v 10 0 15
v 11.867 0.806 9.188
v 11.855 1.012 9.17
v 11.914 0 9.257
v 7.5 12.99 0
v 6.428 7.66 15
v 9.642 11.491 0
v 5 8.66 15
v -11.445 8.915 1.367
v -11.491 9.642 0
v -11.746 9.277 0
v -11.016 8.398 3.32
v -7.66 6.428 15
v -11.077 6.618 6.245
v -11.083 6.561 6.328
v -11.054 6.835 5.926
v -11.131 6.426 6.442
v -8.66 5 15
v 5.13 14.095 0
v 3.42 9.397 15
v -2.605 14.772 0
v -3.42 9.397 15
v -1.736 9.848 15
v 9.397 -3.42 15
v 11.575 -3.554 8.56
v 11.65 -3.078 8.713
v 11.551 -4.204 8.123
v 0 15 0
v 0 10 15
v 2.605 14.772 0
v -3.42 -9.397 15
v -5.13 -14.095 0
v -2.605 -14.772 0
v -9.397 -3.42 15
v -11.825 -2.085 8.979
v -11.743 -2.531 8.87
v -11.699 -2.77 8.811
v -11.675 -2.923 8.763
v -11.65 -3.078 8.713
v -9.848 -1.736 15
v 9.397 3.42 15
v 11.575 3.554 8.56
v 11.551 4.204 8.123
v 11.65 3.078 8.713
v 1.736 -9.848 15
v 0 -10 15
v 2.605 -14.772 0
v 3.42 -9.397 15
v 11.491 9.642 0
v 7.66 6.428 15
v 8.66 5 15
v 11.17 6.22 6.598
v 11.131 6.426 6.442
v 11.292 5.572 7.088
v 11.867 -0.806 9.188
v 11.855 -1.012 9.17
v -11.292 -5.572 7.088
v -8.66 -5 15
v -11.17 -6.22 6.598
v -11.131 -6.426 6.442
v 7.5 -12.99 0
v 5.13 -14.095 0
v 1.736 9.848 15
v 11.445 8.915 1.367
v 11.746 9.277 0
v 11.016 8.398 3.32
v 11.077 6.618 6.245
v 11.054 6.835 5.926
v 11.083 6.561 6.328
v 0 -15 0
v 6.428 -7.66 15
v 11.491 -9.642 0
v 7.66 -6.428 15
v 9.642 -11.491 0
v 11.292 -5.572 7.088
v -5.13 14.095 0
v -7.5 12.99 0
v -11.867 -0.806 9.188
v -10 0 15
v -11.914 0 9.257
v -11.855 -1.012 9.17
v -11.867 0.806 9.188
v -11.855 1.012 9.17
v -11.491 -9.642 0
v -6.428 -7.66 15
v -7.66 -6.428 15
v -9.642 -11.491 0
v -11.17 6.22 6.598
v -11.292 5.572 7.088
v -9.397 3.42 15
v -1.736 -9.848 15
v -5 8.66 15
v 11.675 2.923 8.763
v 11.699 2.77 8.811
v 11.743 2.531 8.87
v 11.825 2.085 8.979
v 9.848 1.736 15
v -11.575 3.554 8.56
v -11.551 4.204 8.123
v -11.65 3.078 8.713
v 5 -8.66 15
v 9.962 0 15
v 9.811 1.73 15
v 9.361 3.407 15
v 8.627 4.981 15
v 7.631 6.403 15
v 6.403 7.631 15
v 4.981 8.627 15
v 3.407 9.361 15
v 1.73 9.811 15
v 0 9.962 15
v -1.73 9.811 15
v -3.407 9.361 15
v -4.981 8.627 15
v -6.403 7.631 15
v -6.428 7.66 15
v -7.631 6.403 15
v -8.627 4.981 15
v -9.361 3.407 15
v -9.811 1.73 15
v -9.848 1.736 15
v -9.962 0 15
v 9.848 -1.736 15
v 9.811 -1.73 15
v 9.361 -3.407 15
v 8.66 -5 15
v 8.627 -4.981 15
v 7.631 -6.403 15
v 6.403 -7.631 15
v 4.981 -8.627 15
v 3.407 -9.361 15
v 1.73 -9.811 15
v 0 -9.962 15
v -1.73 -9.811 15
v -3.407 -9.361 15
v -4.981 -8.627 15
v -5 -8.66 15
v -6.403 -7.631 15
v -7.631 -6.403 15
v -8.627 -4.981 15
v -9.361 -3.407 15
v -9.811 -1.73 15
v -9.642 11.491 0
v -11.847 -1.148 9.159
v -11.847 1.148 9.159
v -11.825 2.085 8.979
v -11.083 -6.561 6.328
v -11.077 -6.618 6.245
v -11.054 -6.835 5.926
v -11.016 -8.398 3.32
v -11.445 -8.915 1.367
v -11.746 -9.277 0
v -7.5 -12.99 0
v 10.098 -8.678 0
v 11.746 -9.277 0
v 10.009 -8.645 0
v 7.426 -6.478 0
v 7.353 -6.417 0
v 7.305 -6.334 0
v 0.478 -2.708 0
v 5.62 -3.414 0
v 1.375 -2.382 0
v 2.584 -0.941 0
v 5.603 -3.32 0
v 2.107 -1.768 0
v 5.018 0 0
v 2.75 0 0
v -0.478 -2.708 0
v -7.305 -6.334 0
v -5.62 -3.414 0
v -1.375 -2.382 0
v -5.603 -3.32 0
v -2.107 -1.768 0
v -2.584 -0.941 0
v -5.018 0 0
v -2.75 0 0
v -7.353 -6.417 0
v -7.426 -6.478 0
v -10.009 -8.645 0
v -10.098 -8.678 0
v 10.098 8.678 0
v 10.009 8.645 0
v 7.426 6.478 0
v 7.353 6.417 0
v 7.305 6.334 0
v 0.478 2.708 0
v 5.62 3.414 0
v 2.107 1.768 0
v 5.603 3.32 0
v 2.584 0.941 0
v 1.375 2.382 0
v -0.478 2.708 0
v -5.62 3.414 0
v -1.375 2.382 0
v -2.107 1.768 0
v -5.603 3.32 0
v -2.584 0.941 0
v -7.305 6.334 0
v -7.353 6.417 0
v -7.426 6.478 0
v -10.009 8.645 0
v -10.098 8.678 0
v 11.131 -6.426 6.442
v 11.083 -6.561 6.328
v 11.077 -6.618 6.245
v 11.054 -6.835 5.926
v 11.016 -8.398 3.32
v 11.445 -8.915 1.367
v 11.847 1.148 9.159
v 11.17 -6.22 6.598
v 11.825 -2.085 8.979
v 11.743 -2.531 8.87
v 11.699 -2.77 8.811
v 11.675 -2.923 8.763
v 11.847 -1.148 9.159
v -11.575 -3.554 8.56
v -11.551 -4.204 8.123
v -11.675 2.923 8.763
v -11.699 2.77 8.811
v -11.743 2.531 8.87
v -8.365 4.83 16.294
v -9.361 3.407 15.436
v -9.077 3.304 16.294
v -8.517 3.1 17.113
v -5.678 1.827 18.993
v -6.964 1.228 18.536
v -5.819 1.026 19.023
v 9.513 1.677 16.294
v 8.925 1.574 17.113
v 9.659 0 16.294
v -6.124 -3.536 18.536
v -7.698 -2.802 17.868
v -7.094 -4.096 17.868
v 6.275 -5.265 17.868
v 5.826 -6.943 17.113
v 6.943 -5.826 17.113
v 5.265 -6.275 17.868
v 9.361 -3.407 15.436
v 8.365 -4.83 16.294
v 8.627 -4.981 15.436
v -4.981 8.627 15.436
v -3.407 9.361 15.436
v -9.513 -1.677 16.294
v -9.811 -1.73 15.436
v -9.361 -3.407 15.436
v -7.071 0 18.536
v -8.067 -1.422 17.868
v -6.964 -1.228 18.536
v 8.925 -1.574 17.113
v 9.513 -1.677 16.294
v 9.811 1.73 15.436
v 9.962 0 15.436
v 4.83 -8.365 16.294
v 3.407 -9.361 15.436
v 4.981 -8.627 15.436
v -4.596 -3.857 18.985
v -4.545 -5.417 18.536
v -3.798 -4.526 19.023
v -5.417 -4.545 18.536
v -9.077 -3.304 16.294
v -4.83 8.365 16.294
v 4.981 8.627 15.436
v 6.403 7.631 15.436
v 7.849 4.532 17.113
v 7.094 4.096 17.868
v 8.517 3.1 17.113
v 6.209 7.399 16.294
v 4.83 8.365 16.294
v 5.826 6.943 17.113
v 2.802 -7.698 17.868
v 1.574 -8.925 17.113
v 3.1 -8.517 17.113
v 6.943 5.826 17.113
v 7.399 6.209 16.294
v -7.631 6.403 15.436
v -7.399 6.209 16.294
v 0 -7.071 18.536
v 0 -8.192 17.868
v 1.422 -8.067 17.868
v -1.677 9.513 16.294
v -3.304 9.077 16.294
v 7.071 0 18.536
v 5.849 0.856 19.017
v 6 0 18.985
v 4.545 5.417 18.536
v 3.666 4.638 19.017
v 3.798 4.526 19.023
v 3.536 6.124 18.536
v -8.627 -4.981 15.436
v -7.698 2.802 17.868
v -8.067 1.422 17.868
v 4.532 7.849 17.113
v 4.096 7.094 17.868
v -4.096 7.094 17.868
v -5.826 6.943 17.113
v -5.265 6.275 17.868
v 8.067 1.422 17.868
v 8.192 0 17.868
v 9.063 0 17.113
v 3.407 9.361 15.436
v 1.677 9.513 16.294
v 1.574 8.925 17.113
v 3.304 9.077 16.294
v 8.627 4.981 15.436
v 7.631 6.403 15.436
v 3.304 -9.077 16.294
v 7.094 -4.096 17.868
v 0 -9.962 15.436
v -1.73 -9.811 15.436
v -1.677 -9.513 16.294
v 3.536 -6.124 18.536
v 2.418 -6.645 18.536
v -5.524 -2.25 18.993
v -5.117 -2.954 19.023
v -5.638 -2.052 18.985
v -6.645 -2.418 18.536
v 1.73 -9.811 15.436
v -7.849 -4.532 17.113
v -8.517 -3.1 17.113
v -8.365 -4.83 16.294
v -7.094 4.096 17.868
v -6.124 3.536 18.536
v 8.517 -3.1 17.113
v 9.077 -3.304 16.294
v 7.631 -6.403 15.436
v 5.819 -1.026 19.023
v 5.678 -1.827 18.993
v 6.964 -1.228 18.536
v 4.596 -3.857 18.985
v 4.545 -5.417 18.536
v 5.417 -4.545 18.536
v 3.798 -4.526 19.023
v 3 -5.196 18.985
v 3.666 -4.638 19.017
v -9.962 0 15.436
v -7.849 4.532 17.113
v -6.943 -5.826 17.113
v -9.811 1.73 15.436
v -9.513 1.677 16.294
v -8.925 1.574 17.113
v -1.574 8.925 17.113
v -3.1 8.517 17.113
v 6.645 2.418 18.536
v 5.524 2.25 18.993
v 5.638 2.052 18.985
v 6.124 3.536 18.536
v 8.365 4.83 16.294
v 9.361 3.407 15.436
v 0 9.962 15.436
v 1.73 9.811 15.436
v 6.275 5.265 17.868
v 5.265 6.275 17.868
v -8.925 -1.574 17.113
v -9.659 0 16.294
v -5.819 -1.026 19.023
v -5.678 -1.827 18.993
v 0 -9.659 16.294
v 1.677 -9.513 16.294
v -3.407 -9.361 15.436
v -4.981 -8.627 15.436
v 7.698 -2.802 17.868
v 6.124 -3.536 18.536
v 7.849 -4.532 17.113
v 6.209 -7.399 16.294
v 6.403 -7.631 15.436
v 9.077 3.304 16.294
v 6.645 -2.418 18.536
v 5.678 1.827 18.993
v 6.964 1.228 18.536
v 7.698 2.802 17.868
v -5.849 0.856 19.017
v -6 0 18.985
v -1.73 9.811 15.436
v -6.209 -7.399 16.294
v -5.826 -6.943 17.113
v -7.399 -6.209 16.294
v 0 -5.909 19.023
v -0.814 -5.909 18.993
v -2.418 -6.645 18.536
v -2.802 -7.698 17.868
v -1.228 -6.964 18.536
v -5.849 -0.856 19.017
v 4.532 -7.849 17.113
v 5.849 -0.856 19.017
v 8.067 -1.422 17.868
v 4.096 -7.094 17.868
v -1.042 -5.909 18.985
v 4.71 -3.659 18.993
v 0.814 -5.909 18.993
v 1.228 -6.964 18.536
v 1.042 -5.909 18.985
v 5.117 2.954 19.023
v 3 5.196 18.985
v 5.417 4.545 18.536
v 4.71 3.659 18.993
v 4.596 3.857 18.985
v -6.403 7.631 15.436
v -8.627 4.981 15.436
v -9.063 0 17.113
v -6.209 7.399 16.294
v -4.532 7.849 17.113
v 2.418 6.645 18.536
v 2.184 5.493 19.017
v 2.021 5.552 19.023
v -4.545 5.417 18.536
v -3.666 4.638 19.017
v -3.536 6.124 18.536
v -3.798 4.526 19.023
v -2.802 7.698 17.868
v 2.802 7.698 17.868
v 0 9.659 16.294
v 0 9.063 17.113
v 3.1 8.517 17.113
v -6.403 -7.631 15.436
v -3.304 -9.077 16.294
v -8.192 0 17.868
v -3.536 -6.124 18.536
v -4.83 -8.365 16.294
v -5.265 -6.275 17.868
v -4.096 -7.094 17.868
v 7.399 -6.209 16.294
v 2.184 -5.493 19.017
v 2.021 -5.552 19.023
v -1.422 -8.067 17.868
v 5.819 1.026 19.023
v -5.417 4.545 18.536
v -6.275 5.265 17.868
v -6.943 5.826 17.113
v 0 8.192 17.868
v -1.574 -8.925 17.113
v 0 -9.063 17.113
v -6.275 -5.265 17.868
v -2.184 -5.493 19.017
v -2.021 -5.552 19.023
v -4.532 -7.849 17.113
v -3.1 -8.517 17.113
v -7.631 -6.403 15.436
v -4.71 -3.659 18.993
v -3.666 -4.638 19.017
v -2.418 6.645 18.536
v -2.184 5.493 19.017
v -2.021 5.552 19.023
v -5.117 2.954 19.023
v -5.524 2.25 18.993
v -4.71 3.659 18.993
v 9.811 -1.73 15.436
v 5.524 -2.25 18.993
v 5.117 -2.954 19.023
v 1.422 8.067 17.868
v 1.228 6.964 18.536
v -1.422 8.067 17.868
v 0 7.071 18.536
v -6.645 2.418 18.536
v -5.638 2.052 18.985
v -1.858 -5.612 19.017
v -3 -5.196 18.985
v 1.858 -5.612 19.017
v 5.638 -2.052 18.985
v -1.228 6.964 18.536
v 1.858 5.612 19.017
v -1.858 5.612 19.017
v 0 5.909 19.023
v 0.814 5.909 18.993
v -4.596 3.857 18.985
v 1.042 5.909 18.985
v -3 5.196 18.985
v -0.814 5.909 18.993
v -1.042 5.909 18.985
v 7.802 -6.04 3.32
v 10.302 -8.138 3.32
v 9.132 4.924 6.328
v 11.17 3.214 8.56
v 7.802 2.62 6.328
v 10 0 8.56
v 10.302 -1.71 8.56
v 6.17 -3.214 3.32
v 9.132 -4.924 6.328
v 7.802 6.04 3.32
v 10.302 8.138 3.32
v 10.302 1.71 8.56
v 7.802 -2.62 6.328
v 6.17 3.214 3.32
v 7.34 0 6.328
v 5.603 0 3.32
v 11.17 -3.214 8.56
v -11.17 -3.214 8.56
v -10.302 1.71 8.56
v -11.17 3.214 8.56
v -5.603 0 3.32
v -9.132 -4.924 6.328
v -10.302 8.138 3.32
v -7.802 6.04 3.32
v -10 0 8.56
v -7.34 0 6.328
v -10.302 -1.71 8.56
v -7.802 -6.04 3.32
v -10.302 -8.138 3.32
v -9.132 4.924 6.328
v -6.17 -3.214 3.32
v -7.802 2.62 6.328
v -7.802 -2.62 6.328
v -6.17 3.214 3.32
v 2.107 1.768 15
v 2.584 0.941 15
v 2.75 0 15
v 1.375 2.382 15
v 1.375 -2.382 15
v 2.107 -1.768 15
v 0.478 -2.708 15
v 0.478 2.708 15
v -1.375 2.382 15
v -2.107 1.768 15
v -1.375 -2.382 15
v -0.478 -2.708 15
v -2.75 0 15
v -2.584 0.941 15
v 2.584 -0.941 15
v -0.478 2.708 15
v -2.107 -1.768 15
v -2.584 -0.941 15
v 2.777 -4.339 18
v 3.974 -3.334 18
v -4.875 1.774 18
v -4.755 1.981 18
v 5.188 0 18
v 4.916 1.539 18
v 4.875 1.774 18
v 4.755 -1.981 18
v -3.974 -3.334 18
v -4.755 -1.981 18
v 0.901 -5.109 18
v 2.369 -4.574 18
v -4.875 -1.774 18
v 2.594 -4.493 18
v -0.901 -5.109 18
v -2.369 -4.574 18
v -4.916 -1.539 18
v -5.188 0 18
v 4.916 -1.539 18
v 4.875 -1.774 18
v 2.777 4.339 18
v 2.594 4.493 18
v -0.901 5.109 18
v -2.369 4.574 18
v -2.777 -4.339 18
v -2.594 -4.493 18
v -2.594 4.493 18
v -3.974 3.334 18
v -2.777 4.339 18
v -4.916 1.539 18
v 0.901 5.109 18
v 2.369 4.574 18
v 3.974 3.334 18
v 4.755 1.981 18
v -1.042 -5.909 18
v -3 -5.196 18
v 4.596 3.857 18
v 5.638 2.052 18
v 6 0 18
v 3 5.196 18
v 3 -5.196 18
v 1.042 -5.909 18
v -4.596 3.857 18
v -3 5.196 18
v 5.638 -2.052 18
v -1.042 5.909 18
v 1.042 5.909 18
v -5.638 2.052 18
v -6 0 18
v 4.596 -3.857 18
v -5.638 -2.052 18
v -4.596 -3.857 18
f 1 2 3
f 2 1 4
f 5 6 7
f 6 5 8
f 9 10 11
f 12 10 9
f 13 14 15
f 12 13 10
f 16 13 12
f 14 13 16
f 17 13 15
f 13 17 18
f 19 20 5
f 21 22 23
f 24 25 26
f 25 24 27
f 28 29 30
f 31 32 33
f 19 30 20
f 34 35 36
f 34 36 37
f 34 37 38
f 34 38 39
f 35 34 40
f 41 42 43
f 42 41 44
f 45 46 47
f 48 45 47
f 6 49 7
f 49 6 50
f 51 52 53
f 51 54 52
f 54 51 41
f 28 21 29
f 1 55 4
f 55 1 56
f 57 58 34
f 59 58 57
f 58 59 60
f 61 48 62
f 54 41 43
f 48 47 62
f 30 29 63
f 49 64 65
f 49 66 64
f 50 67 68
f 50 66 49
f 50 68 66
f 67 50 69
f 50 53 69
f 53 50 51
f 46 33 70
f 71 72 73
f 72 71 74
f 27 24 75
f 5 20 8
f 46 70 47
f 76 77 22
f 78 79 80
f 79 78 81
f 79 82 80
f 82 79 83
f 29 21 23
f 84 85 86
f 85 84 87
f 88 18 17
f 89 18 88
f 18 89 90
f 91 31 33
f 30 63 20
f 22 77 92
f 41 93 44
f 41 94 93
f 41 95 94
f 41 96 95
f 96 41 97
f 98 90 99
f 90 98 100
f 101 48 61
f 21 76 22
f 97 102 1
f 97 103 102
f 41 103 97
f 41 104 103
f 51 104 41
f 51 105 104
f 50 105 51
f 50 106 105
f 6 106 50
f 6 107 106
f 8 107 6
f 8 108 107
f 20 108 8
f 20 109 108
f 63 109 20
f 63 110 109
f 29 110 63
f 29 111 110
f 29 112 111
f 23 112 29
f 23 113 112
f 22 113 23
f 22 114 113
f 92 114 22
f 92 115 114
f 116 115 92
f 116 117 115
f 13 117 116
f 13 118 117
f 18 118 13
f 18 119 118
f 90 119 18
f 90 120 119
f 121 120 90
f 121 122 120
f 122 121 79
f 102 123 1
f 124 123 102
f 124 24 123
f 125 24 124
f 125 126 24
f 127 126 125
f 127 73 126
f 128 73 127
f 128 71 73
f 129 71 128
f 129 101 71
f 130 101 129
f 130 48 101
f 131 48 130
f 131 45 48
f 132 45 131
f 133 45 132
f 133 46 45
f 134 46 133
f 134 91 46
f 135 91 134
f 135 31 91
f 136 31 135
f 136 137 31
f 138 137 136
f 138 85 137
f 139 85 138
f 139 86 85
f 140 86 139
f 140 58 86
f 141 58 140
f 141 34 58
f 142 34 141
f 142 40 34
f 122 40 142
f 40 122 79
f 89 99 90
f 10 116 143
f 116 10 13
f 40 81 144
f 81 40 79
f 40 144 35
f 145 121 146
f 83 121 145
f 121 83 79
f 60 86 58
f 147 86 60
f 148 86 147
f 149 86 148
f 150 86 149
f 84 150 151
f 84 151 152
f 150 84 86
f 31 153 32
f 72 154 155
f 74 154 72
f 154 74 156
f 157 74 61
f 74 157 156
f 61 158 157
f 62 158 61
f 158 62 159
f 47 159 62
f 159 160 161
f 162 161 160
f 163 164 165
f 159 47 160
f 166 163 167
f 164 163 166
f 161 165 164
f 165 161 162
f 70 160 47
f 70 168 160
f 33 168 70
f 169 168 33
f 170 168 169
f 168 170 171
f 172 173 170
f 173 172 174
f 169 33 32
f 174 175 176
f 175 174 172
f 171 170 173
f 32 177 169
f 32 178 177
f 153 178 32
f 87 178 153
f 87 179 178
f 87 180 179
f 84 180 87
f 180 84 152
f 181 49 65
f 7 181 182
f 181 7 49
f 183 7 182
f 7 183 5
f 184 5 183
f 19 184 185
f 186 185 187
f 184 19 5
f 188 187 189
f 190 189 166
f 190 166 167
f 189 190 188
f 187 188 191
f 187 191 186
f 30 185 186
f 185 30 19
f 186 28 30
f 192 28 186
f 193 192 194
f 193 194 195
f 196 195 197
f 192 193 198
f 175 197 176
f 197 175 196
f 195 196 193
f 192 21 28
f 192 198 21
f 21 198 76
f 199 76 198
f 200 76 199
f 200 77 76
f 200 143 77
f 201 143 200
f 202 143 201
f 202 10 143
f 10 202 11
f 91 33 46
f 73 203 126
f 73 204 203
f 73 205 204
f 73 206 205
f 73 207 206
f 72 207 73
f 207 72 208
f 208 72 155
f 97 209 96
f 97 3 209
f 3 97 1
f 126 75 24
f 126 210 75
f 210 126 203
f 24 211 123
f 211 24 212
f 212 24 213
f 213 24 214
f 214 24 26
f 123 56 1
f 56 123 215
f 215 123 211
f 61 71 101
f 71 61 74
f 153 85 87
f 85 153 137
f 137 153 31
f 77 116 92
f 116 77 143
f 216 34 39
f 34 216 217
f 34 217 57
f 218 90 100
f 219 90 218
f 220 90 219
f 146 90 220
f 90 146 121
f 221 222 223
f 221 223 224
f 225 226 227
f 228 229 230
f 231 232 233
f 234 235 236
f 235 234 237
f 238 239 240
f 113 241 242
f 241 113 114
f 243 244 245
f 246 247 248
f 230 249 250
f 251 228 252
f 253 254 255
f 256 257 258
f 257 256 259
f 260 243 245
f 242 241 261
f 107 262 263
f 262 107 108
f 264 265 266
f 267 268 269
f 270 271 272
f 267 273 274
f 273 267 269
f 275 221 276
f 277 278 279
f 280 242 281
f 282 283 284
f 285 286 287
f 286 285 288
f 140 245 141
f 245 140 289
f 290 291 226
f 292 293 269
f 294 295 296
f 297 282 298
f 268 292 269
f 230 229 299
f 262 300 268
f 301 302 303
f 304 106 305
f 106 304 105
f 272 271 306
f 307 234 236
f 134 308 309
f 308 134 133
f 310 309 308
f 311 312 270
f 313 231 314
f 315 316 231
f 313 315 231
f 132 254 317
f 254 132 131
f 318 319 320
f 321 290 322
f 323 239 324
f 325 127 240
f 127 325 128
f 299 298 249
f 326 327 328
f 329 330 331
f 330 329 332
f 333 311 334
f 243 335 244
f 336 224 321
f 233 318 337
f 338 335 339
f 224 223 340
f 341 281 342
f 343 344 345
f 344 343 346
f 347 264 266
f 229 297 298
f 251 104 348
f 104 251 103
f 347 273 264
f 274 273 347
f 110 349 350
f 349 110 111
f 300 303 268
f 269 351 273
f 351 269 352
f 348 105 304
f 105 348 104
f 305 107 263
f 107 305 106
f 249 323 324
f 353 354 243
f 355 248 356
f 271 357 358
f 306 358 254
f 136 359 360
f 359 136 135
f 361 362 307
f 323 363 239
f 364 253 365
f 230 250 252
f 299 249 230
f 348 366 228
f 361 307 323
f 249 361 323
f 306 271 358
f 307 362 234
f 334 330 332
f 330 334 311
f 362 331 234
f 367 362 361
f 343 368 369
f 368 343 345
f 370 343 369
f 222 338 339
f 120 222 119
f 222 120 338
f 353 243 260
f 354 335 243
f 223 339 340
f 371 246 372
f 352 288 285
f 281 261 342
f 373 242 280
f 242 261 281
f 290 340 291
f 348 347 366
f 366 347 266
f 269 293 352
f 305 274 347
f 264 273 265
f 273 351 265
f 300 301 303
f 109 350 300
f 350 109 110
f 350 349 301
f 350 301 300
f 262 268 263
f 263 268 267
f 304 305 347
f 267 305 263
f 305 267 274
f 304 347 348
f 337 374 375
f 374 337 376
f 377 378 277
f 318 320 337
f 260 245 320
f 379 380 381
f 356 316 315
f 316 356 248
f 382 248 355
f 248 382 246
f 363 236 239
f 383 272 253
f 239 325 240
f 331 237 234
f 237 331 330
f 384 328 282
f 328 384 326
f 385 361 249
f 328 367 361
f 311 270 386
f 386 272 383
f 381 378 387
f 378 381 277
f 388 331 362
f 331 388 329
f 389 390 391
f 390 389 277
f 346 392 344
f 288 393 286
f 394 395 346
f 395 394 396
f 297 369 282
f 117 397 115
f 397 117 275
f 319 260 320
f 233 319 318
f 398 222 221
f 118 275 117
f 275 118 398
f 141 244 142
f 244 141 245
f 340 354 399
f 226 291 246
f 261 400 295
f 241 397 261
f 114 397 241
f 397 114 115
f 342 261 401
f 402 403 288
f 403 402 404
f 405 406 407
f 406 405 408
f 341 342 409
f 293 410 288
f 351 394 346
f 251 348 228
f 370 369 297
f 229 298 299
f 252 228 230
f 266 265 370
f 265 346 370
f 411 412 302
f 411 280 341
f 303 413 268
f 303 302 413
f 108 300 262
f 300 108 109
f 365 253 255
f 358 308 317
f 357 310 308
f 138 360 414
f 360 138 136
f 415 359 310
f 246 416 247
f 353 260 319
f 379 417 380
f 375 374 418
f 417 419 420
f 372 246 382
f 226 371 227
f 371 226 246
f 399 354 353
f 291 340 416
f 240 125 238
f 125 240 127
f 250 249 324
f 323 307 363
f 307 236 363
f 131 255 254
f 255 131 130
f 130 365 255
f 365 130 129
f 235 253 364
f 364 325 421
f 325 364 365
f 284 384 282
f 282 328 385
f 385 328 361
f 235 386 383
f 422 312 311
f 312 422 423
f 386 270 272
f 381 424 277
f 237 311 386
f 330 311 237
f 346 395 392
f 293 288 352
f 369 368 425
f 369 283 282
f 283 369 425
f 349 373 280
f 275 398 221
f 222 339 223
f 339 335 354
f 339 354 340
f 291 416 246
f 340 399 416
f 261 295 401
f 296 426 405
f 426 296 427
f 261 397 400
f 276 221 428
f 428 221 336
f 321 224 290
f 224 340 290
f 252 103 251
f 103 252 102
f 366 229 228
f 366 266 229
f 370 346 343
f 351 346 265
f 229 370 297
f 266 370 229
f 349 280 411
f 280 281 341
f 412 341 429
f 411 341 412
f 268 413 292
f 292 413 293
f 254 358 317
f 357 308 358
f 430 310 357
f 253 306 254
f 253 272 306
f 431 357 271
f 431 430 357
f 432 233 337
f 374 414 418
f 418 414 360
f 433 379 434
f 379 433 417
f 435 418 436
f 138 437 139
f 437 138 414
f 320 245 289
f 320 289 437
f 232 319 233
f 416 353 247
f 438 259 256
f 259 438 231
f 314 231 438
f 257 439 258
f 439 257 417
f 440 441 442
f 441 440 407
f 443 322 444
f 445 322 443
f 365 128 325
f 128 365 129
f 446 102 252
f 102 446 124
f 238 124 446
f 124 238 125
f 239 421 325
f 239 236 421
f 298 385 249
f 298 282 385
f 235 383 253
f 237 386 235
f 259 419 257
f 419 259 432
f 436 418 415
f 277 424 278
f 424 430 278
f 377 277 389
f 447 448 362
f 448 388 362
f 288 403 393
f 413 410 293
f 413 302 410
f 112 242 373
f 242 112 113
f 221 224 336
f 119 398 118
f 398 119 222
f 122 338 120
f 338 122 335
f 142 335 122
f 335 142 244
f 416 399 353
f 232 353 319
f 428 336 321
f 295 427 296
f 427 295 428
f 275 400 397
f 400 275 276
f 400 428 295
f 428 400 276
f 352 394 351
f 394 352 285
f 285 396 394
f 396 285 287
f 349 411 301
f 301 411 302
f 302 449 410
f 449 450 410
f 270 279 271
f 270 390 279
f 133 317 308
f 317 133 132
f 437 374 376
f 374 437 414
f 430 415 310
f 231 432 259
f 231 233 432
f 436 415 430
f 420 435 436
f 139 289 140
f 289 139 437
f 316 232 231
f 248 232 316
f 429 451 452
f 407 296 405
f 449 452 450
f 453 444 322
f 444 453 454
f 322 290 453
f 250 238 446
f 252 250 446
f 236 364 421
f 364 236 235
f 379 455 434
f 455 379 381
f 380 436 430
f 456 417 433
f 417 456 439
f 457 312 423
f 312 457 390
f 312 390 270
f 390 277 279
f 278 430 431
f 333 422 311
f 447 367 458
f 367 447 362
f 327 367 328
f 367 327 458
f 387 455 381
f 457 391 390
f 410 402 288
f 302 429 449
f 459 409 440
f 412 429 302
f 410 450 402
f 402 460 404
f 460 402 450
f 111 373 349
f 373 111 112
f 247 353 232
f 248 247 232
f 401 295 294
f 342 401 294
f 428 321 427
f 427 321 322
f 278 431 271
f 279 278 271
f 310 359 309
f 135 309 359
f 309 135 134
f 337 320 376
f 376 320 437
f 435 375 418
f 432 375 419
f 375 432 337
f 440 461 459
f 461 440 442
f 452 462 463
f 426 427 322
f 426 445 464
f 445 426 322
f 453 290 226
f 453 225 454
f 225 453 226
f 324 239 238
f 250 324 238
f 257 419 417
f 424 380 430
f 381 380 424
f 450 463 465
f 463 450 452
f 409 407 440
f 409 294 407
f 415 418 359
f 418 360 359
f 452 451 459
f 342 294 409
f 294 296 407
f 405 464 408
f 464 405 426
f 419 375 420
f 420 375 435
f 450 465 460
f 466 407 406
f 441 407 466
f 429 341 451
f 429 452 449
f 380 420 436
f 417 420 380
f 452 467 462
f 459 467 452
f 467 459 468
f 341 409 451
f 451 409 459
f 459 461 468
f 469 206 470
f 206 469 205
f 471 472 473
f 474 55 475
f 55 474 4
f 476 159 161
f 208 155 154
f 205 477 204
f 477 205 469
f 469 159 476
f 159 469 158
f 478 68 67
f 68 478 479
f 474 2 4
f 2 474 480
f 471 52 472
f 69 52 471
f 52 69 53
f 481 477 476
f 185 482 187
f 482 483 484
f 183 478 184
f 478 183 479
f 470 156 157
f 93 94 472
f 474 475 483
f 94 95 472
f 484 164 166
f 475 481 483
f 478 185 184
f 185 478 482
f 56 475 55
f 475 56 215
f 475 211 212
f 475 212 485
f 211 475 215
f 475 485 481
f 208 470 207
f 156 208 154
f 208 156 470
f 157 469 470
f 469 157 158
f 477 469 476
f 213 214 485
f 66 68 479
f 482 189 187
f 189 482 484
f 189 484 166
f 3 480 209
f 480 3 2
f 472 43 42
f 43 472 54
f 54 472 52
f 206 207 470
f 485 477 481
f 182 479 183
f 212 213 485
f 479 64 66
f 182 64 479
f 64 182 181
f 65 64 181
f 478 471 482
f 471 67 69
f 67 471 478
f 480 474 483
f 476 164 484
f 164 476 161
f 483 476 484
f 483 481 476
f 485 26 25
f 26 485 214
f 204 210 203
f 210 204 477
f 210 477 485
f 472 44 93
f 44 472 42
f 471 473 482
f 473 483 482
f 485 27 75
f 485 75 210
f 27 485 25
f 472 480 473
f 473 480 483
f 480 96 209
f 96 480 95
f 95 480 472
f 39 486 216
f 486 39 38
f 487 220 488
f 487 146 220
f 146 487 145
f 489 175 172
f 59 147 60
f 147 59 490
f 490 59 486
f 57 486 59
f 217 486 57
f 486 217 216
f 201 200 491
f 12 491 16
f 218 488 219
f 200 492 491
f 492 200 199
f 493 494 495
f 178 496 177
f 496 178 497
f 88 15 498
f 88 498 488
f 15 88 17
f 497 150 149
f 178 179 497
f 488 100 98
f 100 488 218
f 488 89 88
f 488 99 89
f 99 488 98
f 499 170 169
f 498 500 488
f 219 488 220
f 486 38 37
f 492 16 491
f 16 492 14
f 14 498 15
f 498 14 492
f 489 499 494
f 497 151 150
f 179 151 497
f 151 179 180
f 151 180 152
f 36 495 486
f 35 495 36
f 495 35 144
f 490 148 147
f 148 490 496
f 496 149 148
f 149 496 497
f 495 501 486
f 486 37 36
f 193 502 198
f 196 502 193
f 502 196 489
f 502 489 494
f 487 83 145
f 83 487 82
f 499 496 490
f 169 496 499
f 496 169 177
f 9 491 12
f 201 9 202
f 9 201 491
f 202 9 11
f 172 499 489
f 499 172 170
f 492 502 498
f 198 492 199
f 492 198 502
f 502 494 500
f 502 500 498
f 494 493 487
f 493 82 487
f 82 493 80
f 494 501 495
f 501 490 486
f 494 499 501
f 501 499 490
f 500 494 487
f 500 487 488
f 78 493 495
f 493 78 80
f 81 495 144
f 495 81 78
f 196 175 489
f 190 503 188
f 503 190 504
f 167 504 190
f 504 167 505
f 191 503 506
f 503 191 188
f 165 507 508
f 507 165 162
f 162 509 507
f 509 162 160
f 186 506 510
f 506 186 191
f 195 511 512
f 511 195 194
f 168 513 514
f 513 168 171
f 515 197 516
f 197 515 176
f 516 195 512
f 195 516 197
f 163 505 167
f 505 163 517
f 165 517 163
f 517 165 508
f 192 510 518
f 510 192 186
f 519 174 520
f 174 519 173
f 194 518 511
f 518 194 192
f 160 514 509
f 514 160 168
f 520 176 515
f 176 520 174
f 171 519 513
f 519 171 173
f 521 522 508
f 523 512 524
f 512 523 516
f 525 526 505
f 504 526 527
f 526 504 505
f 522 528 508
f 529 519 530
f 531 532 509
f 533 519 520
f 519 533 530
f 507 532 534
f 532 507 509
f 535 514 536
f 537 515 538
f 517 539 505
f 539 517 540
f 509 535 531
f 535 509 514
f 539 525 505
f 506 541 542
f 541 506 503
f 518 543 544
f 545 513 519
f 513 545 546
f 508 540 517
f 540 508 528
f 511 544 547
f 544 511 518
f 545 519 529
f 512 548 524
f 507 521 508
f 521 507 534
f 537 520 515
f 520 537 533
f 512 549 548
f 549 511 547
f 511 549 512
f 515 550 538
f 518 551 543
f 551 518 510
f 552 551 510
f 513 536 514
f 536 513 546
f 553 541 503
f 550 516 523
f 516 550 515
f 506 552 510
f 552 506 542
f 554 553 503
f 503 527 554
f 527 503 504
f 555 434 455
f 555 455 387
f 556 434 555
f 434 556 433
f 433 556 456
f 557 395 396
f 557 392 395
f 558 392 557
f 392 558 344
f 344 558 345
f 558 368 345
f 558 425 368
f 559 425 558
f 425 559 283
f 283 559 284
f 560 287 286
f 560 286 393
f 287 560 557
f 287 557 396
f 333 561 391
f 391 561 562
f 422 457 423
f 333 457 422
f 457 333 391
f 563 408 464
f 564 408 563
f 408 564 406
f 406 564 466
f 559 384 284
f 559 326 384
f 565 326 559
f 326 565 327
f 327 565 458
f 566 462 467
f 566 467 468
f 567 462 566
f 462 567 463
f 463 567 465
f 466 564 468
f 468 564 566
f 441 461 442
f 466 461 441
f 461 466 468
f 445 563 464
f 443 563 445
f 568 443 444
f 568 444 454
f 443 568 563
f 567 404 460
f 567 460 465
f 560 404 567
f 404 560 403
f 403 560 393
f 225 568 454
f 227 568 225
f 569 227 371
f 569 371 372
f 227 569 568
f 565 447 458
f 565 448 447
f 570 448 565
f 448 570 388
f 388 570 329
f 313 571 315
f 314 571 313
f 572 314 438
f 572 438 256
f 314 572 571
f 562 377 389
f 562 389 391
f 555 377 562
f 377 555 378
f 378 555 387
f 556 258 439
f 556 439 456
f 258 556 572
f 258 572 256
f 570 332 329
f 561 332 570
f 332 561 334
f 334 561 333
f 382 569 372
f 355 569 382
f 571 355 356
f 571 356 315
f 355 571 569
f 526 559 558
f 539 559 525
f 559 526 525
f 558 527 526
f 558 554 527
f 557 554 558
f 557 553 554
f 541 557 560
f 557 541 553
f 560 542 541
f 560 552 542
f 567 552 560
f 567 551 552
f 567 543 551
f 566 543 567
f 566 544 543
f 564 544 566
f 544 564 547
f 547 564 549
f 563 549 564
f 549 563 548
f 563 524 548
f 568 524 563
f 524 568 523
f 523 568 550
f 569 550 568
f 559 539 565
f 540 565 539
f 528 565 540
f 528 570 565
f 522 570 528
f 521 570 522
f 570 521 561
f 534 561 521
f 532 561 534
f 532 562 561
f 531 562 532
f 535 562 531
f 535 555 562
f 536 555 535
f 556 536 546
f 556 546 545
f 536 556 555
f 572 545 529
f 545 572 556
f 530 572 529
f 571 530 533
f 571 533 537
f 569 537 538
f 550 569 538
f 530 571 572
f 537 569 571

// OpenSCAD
// file: configuration.scad
$fn = 18;

wall = 5;

bolt_slop = .5;
nut_slop = .85;
bolt_dia = 5+bolt_slop;
bolt_rad = bolt_dia/2;
bolt_cap_dia = 9.5+bolt_slop;
bolt_cap_rad = bolt_cap_dia/2;
nut_dia = 9+nut_slop;
nut_rad = nut_dia/2;
nut_height = 3;

ext_x = 20;
ext_y = 60;
// main file
include <configuration.scad>;

foot(taper = true);

foot_rad = 15;

module foot(taper = false){
	difference(){
		union(){
			cylinder(r1=foot_rad, r2=foot_rad-wall, h=15, $fn=36);
			translate([0,0,15]) scale([1,1,.5]) sphere(r=foot_rad-wall, $fn=36);
		}
		
		translate([0,0,-.1]) cylinder(r=bolt_rad, h=25);
		translate([0,0,15]) cylinder(r1=(taper)?bolt_rad:bolt_cap_rad, r2=bolt_cap_rad+1, h=4);
		translate([0,0,18]) cylinder(r=bolt_cap_rad+1, h=4);

		//scallop the edges, to put cables through the etrusion
		for(i=[0:1]) mirror([i,0,0]) translate([foot_rad,0,-.1]) sphere(r=foot_rad-wall);
	}
}
